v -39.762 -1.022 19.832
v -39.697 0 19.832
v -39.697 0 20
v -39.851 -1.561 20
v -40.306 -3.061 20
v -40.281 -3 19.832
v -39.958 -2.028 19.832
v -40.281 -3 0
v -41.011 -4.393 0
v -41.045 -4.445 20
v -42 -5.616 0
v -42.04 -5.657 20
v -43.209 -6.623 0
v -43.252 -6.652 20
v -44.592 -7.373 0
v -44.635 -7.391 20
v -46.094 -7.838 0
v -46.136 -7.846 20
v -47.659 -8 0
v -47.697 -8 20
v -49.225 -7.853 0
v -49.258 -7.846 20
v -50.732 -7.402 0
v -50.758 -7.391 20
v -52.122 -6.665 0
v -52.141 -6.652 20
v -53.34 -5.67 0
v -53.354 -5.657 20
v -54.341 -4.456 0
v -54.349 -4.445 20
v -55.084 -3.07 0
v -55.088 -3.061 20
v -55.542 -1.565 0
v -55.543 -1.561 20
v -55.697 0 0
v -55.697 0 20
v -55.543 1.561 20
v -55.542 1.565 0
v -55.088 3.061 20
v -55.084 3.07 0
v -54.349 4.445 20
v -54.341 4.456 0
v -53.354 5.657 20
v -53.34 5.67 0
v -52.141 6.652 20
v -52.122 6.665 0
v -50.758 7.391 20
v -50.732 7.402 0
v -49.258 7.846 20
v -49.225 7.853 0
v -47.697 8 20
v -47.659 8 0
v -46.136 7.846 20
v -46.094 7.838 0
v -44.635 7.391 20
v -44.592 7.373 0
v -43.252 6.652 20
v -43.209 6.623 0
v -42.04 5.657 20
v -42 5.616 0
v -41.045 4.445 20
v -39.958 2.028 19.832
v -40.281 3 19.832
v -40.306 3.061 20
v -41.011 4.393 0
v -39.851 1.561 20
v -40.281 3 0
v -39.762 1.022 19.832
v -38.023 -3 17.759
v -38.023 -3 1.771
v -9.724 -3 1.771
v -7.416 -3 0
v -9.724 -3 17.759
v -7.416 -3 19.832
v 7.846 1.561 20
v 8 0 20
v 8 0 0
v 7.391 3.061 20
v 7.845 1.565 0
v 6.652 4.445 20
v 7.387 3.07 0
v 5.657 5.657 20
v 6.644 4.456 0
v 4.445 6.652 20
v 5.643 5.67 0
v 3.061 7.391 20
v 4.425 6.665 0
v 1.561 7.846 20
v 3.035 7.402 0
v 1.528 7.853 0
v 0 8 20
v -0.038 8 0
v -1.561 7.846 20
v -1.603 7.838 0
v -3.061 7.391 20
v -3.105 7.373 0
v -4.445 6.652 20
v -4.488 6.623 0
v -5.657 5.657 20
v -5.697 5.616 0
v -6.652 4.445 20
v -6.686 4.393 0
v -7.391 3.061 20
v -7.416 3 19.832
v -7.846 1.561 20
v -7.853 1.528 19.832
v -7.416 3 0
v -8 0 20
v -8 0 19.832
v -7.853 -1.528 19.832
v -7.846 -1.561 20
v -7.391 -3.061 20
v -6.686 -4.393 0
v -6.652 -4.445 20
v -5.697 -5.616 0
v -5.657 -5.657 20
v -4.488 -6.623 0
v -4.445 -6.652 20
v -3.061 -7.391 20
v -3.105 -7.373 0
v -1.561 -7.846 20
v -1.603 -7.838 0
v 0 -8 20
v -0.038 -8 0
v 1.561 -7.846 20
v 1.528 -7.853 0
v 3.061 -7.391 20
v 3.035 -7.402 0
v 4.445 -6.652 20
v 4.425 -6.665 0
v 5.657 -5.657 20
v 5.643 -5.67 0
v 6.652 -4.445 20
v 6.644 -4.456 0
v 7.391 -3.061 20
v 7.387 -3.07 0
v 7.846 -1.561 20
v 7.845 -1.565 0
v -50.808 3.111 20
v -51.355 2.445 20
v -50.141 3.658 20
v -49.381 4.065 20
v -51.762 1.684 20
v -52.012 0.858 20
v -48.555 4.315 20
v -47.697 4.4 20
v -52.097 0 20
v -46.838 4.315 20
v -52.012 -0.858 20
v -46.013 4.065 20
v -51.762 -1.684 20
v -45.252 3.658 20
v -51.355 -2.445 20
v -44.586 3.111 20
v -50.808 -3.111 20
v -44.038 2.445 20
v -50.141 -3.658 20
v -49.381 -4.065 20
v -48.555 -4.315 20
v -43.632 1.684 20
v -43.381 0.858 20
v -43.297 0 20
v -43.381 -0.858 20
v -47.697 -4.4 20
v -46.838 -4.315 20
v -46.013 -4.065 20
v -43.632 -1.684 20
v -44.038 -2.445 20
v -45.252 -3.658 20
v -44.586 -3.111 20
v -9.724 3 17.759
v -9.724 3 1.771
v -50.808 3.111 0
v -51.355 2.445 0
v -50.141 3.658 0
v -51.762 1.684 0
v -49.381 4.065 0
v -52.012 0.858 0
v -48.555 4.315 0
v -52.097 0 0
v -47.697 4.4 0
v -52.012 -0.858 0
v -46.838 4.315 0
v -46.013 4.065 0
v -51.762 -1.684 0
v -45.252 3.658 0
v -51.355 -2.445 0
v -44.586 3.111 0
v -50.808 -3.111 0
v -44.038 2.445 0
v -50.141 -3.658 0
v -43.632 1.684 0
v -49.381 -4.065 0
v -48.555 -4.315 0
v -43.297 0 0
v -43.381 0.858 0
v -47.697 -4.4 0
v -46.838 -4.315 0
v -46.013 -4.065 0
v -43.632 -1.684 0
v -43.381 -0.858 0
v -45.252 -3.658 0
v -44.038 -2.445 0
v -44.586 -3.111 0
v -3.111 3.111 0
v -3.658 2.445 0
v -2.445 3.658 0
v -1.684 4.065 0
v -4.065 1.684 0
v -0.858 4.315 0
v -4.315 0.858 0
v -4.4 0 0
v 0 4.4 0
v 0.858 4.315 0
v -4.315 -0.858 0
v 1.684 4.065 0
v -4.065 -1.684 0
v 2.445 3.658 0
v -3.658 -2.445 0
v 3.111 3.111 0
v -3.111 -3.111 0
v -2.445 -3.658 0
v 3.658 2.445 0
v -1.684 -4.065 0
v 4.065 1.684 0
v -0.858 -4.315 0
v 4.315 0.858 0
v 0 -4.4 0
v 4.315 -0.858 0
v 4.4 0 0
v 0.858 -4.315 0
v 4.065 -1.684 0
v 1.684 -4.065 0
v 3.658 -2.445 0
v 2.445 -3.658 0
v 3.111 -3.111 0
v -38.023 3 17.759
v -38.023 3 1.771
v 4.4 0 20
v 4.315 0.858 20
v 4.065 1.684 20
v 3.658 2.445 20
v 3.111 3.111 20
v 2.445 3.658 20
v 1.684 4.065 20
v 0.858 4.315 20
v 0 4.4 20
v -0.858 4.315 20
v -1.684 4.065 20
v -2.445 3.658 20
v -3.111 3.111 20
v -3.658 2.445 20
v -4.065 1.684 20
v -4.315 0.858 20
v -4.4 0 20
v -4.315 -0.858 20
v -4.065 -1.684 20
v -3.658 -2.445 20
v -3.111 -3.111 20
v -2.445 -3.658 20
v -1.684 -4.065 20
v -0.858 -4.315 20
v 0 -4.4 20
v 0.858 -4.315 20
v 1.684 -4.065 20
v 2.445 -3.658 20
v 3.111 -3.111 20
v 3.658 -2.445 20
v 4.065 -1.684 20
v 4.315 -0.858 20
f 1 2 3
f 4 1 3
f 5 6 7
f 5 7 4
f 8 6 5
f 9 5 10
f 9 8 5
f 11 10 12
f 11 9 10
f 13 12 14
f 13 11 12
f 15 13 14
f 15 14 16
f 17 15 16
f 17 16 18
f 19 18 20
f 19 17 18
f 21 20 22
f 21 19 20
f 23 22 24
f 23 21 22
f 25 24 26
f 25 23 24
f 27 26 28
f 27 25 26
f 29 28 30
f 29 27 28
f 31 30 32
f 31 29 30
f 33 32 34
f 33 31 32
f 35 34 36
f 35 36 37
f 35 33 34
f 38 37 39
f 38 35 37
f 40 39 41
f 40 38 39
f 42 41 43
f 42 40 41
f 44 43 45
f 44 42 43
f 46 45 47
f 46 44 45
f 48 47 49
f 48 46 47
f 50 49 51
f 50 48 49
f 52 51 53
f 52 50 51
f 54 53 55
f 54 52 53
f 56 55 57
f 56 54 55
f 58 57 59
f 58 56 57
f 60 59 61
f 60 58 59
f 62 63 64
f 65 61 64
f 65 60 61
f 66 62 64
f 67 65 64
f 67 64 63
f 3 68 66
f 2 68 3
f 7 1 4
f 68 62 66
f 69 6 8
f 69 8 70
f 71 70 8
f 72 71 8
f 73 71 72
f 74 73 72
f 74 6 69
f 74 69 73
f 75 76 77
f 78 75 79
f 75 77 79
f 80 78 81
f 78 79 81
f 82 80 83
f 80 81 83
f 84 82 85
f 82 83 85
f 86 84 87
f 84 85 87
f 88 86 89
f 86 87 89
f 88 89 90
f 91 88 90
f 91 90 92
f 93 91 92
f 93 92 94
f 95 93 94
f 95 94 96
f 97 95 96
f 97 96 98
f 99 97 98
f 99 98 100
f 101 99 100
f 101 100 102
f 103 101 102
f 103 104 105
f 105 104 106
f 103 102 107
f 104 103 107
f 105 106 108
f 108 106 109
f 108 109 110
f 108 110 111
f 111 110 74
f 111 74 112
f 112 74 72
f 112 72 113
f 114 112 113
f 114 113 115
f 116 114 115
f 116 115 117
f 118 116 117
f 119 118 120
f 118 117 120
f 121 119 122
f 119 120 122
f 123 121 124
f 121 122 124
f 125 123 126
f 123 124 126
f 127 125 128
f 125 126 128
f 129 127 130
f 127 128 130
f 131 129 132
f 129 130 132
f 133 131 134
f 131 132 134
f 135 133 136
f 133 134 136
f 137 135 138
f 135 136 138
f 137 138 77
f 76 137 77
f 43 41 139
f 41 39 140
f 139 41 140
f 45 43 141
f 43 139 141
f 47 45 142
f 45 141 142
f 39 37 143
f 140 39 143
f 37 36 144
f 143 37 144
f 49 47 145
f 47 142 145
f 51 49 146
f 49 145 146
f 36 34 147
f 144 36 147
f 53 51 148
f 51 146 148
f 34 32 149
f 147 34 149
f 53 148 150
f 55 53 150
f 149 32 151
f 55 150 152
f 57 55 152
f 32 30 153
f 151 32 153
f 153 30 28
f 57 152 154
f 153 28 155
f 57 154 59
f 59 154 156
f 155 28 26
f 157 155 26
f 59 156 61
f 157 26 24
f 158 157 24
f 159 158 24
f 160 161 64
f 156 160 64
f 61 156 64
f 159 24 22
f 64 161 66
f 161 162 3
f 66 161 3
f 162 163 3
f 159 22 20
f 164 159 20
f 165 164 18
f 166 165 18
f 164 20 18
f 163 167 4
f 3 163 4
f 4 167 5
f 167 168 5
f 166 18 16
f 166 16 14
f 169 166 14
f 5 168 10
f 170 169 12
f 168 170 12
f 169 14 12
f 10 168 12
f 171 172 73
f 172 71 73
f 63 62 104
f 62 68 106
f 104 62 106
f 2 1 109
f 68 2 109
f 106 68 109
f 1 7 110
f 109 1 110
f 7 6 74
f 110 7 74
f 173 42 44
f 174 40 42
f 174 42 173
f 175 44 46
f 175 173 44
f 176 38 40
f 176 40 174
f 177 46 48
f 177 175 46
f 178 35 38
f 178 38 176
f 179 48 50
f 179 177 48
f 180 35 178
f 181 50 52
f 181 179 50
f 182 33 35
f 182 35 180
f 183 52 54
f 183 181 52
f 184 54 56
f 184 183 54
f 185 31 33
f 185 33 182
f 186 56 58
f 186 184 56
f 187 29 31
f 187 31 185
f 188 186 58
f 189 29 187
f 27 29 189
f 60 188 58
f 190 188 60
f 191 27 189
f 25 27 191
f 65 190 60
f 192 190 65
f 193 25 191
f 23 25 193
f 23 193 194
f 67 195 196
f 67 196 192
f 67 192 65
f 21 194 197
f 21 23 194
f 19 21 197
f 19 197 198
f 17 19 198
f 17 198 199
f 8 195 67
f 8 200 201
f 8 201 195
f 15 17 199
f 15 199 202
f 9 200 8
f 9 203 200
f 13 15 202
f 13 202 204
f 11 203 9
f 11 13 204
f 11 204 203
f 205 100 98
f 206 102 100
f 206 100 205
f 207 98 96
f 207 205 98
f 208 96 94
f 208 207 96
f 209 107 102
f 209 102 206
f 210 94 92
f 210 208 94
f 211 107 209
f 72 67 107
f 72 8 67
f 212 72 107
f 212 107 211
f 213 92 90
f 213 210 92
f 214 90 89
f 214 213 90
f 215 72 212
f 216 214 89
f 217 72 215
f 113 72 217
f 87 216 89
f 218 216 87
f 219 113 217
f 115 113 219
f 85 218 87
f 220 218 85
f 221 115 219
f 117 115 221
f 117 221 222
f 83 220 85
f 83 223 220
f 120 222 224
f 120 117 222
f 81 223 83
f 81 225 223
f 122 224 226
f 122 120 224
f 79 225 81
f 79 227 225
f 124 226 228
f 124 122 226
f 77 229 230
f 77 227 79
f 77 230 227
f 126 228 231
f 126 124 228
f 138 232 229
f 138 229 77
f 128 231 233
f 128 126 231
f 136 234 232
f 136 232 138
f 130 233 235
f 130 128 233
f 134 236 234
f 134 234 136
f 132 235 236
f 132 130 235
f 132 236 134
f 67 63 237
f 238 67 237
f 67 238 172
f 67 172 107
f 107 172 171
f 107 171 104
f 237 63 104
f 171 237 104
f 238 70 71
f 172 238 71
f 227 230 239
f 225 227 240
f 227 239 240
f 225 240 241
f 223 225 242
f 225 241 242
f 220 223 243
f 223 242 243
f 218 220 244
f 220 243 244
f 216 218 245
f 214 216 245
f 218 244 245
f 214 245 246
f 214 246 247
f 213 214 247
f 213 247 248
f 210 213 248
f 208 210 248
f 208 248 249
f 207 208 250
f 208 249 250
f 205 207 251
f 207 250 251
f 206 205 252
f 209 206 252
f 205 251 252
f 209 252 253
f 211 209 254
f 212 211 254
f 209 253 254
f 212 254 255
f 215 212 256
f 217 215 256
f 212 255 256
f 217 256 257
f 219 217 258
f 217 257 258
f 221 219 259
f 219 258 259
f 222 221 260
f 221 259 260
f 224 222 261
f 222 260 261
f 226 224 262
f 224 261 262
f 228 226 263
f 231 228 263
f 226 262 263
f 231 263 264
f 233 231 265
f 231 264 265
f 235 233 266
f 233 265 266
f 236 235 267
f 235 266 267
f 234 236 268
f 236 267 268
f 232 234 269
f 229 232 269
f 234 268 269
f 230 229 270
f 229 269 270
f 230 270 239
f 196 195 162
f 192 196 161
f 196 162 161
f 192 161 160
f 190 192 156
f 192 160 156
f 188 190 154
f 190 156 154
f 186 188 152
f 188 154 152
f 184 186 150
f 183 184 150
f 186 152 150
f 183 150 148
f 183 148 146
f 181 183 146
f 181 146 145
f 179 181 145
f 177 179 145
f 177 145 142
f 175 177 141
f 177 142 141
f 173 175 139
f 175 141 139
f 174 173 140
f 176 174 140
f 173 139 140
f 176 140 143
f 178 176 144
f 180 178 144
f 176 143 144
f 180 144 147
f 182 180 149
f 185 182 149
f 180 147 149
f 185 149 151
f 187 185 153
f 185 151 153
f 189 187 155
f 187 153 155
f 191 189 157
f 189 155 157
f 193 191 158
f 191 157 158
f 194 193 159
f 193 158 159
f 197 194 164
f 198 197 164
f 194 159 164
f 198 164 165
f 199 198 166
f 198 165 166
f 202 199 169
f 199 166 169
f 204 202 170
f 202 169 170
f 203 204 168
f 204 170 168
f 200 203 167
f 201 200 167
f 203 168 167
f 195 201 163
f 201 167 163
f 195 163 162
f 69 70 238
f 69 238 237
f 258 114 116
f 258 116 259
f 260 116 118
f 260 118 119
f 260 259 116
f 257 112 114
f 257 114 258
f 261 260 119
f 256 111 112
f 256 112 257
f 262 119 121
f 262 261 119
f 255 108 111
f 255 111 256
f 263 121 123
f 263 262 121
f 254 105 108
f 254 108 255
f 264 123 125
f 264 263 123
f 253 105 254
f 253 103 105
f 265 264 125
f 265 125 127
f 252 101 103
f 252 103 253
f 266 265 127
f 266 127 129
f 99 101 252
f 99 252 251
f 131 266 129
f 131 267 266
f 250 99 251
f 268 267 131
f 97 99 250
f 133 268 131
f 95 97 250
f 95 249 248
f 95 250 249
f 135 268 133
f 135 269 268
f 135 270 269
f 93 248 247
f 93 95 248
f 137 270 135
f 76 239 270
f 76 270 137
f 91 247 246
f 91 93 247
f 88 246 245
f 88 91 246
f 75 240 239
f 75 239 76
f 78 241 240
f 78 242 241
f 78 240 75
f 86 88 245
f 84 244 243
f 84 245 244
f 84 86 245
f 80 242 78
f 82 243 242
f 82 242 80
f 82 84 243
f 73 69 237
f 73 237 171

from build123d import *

# Parameters (mm, degrees)
F0_R      = 8
F1_DEPTH  = 20
F2_R      = 4.4
F3_DEPTH  = 20
F4_W      = 34.088476
F4_H      = 19.83197
F4_W_2    = 28.298552
F4_H_2    = 15.987633
F5_DEPTH  = 3
F6_DEPTH  = 3
F7_R      = 8
F8_DEPTH  = 20
F9_R      = 4.4
F10_DEPTH = 20


with BuildPart() as f1:
    # F0 (on Top) → F1 (new body)
    with BuildSketch(Plane.XY):
        Circle(F0_R)
    extrude(amount=F1_DEPTH)

    # F2 (on face) → F3 (cut)
    with BuildSketch(Plane.XY.offset(20)):
        Circle(F2_R)
    extrude(amount=-F3_DEPTH, mode=Mode.SUBTRACT)

    # F4 (on Front) → F5 (join)
    with BuildSketch(Plane.XZ):
        with Locations((-23.512398, 9.915985)):
            Rectangle(F4_W, F4_H)
        with Locations((-23.873756, 9.765204)):
            Rectangle(F4_W_2, F4_H_2, mode=Mode.SUBTRACT)
    extrude(amount=F5_DEPTH)

    # F4 (on Front) → F6 (join)
    with BuildSketch(Plane.XZ):
        with Locations((-23.512398, 9.915985)):
            Rectangle(F4_W, F4_H)
        with Locations((-23.873756, 9.765204)):
            Rectangle(F4_W_2, F4_H_2, mode=Mode.SUBTRACT)
    extrude(amount=-F6_DEPTH)

    # F7 (on face) → F8 (join)
    with BuildSketch(Plane(origin=(0, 0, 0), x_dir=(1, 0, 0), z_dir=(0, 0, -1))):
        with Locations((-47.696788, 0)):
            Circle(F7_R)
    extrude(amount=-F8_DEPTH)

    # F9 (on face) → F10 (cut)
    with BuildSketch(Plane.XY.offset(20)):
        with Locations((-47.696788, 0)):
            Circle(F9_R)
    extrude(amount=-F10_DEPTH, mode=Mode.SUBTRACT)


solid = f1.part
